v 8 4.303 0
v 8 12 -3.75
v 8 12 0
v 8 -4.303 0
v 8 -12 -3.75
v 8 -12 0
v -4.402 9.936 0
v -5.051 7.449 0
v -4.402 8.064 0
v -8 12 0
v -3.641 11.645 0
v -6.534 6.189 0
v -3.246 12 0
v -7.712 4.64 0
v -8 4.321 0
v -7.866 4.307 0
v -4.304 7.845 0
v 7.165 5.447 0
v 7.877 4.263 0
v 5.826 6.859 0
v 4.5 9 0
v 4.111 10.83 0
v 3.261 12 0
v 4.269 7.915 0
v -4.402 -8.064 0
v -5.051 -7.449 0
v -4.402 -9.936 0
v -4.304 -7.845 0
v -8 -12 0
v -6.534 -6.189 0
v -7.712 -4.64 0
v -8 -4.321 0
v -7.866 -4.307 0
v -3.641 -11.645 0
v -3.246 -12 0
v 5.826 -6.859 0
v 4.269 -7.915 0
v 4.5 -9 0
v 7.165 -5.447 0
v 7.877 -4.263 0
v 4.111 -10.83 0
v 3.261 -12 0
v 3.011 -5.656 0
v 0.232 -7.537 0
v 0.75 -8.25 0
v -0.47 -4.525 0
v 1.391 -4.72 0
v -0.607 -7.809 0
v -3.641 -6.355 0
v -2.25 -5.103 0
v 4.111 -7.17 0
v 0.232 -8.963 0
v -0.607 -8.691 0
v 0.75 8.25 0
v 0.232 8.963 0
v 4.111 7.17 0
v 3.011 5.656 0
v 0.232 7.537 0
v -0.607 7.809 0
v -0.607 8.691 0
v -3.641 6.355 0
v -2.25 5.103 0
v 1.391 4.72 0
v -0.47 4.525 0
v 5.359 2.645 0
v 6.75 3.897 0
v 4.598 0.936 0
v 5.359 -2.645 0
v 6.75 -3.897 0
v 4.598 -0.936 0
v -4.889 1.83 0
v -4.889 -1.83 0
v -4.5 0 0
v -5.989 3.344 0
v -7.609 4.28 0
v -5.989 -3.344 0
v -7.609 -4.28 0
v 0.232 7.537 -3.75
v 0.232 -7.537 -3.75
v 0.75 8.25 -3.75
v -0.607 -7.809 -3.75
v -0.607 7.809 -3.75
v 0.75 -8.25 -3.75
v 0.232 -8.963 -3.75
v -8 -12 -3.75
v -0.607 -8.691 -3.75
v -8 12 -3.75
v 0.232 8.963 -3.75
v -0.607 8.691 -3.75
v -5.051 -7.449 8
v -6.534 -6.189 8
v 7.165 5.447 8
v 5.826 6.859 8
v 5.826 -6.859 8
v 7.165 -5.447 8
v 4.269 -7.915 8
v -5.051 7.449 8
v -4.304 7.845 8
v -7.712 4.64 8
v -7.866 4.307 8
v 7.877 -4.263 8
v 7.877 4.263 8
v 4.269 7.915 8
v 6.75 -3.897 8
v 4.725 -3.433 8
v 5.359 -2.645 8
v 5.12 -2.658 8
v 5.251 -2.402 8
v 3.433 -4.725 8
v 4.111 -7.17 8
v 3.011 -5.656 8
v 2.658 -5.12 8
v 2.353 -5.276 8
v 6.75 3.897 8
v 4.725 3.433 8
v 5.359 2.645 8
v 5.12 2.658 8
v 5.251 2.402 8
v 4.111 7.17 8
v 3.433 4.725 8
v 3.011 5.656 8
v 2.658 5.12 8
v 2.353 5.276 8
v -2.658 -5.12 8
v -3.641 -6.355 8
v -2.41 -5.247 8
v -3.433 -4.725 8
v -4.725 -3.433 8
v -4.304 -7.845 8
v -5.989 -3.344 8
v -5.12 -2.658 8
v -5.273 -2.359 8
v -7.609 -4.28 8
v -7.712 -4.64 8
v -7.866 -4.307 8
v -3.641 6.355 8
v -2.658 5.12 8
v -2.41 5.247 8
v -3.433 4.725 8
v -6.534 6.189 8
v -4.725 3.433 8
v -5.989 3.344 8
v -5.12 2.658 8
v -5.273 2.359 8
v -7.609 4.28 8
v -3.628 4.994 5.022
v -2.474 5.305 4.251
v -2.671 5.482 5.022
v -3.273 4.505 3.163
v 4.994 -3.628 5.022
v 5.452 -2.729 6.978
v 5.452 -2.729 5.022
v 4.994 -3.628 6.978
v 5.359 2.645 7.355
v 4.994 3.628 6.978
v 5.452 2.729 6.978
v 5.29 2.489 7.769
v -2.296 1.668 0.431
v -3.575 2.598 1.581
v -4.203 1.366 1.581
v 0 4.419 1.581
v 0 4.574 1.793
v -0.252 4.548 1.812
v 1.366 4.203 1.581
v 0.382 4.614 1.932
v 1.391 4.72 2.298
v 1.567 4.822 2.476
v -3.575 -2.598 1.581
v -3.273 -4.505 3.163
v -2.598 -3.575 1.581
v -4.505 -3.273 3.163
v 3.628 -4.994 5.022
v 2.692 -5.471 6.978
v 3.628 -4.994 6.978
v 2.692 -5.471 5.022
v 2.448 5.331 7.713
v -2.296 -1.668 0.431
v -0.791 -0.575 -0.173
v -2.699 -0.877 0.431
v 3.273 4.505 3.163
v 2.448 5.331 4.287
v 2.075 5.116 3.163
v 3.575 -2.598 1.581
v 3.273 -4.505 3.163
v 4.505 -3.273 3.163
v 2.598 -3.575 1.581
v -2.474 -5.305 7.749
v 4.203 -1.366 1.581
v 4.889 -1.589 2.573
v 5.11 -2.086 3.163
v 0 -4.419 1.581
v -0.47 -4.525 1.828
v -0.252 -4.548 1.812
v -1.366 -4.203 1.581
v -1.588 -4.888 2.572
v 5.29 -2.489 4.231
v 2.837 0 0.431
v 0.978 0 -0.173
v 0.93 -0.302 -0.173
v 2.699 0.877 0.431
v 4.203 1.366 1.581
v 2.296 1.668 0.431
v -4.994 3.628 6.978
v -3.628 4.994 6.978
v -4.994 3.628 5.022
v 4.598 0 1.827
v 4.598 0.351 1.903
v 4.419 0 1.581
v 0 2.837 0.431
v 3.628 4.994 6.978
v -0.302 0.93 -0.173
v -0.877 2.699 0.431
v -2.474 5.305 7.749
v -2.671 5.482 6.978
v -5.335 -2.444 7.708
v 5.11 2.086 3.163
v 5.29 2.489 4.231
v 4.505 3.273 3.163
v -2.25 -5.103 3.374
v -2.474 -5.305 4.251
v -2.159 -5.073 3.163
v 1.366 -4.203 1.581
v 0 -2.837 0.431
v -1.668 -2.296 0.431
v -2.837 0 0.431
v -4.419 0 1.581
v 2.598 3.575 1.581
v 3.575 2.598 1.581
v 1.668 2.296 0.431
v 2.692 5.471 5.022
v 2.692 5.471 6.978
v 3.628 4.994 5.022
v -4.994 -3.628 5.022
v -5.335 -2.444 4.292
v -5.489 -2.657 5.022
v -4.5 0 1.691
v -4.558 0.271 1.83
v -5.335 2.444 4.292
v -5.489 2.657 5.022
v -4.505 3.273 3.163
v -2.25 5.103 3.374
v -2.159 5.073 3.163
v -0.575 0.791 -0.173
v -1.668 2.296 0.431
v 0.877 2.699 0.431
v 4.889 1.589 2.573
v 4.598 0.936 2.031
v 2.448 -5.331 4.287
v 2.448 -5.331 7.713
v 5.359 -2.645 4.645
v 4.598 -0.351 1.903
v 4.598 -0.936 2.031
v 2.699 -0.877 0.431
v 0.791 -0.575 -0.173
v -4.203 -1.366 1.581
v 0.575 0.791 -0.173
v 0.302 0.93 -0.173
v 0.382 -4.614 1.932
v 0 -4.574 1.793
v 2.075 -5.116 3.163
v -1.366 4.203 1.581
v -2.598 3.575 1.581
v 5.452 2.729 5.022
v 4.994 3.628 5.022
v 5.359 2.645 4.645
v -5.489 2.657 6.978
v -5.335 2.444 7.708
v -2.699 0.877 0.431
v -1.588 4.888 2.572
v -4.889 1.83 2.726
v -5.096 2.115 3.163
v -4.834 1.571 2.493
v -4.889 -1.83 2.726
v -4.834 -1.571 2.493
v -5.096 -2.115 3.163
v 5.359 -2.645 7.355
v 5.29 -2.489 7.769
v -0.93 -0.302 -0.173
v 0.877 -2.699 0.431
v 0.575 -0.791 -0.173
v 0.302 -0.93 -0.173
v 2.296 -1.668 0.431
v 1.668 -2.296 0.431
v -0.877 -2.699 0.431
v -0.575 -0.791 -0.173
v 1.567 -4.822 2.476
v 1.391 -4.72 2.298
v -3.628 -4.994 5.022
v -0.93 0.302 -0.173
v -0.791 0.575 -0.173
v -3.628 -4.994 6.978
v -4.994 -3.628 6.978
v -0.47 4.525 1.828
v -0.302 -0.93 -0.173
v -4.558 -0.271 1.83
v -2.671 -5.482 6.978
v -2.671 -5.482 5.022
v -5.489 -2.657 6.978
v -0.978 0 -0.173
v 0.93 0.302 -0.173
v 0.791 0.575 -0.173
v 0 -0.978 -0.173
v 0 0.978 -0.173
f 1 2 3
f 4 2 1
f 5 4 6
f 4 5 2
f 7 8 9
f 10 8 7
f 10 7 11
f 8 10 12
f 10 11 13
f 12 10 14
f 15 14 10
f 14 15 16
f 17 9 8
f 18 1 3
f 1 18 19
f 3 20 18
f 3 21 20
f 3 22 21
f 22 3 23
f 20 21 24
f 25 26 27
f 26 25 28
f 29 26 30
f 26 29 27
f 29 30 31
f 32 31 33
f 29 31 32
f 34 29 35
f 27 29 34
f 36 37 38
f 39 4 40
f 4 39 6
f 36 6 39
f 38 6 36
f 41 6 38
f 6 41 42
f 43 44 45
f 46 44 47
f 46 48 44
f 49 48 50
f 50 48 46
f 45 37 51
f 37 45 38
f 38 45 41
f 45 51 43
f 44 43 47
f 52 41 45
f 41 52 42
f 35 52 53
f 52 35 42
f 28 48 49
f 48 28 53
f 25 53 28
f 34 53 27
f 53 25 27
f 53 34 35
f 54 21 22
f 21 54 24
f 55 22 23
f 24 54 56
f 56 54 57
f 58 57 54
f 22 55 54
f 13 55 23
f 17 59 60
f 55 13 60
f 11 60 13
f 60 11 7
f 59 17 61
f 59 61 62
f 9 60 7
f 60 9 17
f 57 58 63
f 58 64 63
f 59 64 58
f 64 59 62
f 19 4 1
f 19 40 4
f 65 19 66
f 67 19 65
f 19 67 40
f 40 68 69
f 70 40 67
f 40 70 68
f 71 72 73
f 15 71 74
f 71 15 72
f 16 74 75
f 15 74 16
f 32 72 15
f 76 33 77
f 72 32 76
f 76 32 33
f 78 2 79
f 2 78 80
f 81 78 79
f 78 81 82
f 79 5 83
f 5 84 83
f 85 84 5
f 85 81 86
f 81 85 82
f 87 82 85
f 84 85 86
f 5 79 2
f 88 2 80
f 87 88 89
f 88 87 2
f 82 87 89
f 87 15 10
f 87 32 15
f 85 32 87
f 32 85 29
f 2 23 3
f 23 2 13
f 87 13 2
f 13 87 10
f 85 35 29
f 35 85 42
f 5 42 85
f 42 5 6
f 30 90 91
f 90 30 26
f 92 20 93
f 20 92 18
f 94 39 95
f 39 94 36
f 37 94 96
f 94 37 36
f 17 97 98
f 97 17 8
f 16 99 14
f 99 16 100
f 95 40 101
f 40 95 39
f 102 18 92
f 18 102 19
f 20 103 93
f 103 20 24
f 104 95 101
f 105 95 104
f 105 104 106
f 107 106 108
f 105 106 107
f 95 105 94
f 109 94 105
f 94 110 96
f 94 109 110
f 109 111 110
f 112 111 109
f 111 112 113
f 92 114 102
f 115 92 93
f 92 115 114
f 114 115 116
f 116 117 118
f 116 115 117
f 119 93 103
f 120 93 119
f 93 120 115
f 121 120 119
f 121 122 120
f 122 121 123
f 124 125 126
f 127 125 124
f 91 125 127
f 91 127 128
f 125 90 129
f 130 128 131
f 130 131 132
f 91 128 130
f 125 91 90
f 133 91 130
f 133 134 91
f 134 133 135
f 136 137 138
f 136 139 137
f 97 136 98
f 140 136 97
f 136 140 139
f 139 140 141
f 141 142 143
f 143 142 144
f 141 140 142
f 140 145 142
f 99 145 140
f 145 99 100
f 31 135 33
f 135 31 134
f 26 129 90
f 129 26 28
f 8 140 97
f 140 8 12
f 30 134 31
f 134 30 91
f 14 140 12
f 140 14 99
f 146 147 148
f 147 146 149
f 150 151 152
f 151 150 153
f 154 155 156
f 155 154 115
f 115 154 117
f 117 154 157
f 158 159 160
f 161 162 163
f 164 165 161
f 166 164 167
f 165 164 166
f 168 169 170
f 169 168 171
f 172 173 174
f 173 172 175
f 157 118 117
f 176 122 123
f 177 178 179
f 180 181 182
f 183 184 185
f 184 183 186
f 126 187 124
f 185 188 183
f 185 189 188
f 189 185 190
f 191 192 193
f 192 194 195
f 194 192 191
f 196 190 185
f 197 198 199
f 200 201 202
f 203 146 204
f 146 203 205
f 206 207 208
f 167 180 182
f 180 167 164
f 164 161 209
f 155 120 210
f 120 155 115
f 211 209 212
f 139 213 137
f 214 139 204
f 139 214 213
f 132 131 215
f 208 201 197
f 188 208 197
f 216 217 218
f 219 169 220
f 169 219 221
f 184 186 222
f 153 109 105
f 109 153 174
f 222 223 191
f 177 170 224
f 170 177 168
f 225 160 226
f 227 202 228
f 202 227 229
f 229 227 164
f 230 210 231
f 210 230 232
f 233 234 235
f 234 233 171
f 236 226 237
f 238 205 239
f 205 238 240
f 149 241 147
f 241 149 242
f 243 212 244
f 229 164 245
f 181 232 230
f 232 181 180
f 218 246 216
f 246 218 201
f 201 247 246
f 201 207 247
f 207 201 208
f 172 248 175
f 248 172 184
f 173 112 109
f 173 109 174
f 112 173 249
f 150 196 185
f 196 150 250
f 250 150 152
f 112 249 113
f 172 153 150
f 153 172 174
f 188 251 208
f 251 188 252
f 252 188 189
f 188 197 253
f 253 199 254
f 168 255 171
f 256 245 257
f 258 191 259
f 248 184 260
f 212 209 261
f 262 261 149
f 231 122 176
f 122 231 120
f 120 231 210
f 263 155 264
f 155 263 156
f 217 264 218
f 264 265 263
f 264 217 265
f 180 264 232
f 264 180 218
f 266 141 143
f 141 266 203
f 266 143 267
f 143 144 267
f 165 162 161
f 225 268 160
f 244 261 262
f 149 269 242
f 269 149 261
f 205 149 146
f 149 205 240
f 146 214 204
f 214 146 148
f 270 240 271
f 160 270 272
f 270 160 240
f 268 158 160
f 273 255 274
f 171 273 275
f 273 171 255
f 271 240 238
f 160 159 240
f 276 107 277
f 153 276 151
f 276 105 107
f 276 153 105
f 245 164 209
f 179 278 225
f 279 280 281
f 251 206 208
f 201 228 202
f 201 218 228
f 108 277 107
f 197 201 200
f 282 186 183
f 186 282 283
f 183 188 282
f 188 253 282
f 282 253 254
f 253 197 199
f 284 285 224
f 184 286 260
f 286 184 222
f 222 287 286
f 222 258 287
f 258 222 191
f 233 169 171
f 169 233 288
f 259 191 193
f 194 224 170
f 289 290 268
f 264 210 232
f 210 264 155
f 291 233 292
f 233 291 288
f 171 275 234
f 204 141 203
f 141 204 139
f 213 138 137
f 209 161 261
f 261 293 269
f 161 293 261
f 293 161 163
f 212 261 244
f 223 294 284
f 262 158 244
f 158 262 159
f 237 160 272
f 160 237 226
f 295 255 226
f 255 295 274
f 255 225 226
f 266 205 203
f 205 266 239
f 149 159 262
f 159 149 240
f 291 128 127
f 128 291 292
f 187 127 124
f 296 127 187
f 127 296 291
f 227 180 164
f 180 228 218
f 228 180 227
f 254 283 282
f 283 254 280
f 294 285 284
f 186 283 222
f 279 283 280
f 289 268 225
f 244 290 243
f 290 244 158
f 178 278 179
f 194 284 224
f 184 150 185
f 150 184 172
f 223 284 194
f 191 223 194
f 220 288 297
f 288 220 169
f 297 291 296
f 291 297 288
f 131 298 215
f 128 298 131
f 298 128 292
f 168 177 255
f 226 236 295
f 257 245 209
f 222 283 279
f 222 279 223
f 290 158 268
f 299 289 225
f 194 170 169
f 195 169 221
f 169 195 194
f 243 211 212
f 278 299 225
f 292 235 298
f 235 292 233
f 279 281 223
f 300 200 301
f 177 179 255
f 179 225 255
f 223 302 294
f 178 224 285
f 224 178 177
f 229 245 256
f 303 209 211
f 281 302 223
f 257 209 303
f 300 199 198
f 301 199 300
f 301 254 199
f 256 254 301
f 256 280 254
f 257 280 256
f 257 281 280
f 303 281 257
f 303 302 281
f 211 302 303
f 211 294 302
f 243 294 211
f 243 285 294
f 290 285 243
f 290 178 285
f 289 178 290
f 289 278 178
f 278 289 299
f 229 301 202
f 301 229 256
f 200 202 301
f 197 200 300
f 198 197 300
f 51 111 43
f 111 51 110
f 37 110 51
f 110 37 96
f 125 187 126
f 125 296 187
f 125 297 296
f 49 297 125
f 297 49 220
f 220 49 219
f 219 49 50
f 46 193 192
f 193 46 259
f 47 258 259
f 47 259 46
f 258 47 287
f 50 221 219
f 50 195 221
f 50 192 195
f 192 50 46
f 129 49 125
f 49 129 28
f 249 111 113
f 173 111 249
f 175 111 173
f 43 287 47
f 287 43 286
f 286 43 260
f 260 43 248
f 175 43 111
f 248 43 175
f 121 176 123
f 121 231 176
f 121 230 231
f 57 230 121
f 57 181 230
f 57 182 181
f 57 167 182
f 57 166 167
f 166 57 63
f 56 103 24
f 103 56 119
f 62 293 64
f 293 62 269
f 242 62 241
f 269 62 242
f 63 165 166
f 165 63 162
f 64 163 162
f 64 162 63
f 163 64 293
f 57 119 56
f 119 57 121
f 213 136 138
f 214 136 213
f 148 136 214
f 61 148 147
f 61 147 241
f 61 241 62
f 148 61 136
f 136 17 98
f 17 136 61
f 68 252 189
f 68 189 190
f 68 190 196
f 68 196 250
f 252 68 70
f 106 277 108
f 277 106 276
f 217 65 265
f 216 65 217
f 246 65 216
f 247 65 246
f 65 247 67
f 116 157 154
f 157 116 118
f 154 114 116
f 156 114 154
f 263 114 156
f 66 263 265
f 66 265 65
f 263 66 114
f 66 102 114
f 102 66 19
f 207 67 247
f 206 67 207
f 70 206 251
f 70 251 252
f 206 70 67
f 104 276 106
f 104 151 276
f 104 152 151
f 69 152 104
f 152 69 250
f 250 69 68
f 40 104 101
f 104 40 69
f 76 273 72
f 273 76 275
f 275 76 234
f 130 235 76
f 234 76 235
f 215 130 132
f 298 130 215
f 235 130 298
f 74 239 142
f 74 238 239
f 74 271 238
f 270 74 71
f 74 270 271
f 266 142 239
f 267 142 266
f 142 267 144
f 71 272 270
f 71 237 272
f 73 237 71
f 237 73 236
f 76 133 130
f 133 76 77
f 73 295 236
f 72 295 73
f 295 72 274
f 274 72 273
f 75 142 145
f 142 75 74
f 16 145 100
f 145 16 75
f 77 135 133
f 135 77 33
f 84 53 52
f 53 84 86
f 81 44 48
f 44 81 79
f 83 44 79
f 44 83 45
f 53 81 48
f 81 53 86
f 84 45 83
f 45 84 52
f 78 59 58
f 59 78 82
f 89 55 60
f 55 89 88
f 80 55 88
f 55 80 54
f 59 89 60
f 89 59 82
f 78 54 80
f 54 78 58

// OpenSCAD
bearingSize=12; //diameter of ball bearing used
baseWidth=16;
baseLength=24;
baseThickness=3.75; 
screwSize=1.5;  //M2 screw self-threading
screwSpace=16.5; // distance center-center for screws
topWidth=bearingSize*1.5;
tolerance=.5; //.5 slides in well has minimal movement, used surrounding ball bearing

difference(){
    union(){
        //base
        translate([0,0,-baseThickness/2])
        cube([baseWidth, baseLength, baseThickness], center=true);
        //top section, holds bearing
        translate([0,0,2*bearingSize/6])
        cylinder(d=topWidth, h= 2*bearingSize/3, center=true);
}
//bearing
    translate([0,0,bearingSize/2])
    sphere(d=bearingSize+tolerance);
//notches for bearing movement
    translate([0,-topWidth/2,0])
    cylinder(h=2*bearingSize/3,d=topWidth/2);
    translate([0,topWidth/2,0])
    cylinder(h=2*bearingSize/3,d=topWidth/2);
    translate([topWidth/2,0,0])
    cylinder(h=2*bearingSize/3,d=topWidth/2);
    translate([-topWidth/2,0,0])
    cylinder(h=2*bearingSize/3,d=topWidth/2);
//screw holes
    translate([0,-screwSpace/2,0])
    cylinder(h=50, d=screwSize,center=true);
    translate([0,screwSpace/2,0])
    cylinder(h=50, d=screwSize,center=true);
}
